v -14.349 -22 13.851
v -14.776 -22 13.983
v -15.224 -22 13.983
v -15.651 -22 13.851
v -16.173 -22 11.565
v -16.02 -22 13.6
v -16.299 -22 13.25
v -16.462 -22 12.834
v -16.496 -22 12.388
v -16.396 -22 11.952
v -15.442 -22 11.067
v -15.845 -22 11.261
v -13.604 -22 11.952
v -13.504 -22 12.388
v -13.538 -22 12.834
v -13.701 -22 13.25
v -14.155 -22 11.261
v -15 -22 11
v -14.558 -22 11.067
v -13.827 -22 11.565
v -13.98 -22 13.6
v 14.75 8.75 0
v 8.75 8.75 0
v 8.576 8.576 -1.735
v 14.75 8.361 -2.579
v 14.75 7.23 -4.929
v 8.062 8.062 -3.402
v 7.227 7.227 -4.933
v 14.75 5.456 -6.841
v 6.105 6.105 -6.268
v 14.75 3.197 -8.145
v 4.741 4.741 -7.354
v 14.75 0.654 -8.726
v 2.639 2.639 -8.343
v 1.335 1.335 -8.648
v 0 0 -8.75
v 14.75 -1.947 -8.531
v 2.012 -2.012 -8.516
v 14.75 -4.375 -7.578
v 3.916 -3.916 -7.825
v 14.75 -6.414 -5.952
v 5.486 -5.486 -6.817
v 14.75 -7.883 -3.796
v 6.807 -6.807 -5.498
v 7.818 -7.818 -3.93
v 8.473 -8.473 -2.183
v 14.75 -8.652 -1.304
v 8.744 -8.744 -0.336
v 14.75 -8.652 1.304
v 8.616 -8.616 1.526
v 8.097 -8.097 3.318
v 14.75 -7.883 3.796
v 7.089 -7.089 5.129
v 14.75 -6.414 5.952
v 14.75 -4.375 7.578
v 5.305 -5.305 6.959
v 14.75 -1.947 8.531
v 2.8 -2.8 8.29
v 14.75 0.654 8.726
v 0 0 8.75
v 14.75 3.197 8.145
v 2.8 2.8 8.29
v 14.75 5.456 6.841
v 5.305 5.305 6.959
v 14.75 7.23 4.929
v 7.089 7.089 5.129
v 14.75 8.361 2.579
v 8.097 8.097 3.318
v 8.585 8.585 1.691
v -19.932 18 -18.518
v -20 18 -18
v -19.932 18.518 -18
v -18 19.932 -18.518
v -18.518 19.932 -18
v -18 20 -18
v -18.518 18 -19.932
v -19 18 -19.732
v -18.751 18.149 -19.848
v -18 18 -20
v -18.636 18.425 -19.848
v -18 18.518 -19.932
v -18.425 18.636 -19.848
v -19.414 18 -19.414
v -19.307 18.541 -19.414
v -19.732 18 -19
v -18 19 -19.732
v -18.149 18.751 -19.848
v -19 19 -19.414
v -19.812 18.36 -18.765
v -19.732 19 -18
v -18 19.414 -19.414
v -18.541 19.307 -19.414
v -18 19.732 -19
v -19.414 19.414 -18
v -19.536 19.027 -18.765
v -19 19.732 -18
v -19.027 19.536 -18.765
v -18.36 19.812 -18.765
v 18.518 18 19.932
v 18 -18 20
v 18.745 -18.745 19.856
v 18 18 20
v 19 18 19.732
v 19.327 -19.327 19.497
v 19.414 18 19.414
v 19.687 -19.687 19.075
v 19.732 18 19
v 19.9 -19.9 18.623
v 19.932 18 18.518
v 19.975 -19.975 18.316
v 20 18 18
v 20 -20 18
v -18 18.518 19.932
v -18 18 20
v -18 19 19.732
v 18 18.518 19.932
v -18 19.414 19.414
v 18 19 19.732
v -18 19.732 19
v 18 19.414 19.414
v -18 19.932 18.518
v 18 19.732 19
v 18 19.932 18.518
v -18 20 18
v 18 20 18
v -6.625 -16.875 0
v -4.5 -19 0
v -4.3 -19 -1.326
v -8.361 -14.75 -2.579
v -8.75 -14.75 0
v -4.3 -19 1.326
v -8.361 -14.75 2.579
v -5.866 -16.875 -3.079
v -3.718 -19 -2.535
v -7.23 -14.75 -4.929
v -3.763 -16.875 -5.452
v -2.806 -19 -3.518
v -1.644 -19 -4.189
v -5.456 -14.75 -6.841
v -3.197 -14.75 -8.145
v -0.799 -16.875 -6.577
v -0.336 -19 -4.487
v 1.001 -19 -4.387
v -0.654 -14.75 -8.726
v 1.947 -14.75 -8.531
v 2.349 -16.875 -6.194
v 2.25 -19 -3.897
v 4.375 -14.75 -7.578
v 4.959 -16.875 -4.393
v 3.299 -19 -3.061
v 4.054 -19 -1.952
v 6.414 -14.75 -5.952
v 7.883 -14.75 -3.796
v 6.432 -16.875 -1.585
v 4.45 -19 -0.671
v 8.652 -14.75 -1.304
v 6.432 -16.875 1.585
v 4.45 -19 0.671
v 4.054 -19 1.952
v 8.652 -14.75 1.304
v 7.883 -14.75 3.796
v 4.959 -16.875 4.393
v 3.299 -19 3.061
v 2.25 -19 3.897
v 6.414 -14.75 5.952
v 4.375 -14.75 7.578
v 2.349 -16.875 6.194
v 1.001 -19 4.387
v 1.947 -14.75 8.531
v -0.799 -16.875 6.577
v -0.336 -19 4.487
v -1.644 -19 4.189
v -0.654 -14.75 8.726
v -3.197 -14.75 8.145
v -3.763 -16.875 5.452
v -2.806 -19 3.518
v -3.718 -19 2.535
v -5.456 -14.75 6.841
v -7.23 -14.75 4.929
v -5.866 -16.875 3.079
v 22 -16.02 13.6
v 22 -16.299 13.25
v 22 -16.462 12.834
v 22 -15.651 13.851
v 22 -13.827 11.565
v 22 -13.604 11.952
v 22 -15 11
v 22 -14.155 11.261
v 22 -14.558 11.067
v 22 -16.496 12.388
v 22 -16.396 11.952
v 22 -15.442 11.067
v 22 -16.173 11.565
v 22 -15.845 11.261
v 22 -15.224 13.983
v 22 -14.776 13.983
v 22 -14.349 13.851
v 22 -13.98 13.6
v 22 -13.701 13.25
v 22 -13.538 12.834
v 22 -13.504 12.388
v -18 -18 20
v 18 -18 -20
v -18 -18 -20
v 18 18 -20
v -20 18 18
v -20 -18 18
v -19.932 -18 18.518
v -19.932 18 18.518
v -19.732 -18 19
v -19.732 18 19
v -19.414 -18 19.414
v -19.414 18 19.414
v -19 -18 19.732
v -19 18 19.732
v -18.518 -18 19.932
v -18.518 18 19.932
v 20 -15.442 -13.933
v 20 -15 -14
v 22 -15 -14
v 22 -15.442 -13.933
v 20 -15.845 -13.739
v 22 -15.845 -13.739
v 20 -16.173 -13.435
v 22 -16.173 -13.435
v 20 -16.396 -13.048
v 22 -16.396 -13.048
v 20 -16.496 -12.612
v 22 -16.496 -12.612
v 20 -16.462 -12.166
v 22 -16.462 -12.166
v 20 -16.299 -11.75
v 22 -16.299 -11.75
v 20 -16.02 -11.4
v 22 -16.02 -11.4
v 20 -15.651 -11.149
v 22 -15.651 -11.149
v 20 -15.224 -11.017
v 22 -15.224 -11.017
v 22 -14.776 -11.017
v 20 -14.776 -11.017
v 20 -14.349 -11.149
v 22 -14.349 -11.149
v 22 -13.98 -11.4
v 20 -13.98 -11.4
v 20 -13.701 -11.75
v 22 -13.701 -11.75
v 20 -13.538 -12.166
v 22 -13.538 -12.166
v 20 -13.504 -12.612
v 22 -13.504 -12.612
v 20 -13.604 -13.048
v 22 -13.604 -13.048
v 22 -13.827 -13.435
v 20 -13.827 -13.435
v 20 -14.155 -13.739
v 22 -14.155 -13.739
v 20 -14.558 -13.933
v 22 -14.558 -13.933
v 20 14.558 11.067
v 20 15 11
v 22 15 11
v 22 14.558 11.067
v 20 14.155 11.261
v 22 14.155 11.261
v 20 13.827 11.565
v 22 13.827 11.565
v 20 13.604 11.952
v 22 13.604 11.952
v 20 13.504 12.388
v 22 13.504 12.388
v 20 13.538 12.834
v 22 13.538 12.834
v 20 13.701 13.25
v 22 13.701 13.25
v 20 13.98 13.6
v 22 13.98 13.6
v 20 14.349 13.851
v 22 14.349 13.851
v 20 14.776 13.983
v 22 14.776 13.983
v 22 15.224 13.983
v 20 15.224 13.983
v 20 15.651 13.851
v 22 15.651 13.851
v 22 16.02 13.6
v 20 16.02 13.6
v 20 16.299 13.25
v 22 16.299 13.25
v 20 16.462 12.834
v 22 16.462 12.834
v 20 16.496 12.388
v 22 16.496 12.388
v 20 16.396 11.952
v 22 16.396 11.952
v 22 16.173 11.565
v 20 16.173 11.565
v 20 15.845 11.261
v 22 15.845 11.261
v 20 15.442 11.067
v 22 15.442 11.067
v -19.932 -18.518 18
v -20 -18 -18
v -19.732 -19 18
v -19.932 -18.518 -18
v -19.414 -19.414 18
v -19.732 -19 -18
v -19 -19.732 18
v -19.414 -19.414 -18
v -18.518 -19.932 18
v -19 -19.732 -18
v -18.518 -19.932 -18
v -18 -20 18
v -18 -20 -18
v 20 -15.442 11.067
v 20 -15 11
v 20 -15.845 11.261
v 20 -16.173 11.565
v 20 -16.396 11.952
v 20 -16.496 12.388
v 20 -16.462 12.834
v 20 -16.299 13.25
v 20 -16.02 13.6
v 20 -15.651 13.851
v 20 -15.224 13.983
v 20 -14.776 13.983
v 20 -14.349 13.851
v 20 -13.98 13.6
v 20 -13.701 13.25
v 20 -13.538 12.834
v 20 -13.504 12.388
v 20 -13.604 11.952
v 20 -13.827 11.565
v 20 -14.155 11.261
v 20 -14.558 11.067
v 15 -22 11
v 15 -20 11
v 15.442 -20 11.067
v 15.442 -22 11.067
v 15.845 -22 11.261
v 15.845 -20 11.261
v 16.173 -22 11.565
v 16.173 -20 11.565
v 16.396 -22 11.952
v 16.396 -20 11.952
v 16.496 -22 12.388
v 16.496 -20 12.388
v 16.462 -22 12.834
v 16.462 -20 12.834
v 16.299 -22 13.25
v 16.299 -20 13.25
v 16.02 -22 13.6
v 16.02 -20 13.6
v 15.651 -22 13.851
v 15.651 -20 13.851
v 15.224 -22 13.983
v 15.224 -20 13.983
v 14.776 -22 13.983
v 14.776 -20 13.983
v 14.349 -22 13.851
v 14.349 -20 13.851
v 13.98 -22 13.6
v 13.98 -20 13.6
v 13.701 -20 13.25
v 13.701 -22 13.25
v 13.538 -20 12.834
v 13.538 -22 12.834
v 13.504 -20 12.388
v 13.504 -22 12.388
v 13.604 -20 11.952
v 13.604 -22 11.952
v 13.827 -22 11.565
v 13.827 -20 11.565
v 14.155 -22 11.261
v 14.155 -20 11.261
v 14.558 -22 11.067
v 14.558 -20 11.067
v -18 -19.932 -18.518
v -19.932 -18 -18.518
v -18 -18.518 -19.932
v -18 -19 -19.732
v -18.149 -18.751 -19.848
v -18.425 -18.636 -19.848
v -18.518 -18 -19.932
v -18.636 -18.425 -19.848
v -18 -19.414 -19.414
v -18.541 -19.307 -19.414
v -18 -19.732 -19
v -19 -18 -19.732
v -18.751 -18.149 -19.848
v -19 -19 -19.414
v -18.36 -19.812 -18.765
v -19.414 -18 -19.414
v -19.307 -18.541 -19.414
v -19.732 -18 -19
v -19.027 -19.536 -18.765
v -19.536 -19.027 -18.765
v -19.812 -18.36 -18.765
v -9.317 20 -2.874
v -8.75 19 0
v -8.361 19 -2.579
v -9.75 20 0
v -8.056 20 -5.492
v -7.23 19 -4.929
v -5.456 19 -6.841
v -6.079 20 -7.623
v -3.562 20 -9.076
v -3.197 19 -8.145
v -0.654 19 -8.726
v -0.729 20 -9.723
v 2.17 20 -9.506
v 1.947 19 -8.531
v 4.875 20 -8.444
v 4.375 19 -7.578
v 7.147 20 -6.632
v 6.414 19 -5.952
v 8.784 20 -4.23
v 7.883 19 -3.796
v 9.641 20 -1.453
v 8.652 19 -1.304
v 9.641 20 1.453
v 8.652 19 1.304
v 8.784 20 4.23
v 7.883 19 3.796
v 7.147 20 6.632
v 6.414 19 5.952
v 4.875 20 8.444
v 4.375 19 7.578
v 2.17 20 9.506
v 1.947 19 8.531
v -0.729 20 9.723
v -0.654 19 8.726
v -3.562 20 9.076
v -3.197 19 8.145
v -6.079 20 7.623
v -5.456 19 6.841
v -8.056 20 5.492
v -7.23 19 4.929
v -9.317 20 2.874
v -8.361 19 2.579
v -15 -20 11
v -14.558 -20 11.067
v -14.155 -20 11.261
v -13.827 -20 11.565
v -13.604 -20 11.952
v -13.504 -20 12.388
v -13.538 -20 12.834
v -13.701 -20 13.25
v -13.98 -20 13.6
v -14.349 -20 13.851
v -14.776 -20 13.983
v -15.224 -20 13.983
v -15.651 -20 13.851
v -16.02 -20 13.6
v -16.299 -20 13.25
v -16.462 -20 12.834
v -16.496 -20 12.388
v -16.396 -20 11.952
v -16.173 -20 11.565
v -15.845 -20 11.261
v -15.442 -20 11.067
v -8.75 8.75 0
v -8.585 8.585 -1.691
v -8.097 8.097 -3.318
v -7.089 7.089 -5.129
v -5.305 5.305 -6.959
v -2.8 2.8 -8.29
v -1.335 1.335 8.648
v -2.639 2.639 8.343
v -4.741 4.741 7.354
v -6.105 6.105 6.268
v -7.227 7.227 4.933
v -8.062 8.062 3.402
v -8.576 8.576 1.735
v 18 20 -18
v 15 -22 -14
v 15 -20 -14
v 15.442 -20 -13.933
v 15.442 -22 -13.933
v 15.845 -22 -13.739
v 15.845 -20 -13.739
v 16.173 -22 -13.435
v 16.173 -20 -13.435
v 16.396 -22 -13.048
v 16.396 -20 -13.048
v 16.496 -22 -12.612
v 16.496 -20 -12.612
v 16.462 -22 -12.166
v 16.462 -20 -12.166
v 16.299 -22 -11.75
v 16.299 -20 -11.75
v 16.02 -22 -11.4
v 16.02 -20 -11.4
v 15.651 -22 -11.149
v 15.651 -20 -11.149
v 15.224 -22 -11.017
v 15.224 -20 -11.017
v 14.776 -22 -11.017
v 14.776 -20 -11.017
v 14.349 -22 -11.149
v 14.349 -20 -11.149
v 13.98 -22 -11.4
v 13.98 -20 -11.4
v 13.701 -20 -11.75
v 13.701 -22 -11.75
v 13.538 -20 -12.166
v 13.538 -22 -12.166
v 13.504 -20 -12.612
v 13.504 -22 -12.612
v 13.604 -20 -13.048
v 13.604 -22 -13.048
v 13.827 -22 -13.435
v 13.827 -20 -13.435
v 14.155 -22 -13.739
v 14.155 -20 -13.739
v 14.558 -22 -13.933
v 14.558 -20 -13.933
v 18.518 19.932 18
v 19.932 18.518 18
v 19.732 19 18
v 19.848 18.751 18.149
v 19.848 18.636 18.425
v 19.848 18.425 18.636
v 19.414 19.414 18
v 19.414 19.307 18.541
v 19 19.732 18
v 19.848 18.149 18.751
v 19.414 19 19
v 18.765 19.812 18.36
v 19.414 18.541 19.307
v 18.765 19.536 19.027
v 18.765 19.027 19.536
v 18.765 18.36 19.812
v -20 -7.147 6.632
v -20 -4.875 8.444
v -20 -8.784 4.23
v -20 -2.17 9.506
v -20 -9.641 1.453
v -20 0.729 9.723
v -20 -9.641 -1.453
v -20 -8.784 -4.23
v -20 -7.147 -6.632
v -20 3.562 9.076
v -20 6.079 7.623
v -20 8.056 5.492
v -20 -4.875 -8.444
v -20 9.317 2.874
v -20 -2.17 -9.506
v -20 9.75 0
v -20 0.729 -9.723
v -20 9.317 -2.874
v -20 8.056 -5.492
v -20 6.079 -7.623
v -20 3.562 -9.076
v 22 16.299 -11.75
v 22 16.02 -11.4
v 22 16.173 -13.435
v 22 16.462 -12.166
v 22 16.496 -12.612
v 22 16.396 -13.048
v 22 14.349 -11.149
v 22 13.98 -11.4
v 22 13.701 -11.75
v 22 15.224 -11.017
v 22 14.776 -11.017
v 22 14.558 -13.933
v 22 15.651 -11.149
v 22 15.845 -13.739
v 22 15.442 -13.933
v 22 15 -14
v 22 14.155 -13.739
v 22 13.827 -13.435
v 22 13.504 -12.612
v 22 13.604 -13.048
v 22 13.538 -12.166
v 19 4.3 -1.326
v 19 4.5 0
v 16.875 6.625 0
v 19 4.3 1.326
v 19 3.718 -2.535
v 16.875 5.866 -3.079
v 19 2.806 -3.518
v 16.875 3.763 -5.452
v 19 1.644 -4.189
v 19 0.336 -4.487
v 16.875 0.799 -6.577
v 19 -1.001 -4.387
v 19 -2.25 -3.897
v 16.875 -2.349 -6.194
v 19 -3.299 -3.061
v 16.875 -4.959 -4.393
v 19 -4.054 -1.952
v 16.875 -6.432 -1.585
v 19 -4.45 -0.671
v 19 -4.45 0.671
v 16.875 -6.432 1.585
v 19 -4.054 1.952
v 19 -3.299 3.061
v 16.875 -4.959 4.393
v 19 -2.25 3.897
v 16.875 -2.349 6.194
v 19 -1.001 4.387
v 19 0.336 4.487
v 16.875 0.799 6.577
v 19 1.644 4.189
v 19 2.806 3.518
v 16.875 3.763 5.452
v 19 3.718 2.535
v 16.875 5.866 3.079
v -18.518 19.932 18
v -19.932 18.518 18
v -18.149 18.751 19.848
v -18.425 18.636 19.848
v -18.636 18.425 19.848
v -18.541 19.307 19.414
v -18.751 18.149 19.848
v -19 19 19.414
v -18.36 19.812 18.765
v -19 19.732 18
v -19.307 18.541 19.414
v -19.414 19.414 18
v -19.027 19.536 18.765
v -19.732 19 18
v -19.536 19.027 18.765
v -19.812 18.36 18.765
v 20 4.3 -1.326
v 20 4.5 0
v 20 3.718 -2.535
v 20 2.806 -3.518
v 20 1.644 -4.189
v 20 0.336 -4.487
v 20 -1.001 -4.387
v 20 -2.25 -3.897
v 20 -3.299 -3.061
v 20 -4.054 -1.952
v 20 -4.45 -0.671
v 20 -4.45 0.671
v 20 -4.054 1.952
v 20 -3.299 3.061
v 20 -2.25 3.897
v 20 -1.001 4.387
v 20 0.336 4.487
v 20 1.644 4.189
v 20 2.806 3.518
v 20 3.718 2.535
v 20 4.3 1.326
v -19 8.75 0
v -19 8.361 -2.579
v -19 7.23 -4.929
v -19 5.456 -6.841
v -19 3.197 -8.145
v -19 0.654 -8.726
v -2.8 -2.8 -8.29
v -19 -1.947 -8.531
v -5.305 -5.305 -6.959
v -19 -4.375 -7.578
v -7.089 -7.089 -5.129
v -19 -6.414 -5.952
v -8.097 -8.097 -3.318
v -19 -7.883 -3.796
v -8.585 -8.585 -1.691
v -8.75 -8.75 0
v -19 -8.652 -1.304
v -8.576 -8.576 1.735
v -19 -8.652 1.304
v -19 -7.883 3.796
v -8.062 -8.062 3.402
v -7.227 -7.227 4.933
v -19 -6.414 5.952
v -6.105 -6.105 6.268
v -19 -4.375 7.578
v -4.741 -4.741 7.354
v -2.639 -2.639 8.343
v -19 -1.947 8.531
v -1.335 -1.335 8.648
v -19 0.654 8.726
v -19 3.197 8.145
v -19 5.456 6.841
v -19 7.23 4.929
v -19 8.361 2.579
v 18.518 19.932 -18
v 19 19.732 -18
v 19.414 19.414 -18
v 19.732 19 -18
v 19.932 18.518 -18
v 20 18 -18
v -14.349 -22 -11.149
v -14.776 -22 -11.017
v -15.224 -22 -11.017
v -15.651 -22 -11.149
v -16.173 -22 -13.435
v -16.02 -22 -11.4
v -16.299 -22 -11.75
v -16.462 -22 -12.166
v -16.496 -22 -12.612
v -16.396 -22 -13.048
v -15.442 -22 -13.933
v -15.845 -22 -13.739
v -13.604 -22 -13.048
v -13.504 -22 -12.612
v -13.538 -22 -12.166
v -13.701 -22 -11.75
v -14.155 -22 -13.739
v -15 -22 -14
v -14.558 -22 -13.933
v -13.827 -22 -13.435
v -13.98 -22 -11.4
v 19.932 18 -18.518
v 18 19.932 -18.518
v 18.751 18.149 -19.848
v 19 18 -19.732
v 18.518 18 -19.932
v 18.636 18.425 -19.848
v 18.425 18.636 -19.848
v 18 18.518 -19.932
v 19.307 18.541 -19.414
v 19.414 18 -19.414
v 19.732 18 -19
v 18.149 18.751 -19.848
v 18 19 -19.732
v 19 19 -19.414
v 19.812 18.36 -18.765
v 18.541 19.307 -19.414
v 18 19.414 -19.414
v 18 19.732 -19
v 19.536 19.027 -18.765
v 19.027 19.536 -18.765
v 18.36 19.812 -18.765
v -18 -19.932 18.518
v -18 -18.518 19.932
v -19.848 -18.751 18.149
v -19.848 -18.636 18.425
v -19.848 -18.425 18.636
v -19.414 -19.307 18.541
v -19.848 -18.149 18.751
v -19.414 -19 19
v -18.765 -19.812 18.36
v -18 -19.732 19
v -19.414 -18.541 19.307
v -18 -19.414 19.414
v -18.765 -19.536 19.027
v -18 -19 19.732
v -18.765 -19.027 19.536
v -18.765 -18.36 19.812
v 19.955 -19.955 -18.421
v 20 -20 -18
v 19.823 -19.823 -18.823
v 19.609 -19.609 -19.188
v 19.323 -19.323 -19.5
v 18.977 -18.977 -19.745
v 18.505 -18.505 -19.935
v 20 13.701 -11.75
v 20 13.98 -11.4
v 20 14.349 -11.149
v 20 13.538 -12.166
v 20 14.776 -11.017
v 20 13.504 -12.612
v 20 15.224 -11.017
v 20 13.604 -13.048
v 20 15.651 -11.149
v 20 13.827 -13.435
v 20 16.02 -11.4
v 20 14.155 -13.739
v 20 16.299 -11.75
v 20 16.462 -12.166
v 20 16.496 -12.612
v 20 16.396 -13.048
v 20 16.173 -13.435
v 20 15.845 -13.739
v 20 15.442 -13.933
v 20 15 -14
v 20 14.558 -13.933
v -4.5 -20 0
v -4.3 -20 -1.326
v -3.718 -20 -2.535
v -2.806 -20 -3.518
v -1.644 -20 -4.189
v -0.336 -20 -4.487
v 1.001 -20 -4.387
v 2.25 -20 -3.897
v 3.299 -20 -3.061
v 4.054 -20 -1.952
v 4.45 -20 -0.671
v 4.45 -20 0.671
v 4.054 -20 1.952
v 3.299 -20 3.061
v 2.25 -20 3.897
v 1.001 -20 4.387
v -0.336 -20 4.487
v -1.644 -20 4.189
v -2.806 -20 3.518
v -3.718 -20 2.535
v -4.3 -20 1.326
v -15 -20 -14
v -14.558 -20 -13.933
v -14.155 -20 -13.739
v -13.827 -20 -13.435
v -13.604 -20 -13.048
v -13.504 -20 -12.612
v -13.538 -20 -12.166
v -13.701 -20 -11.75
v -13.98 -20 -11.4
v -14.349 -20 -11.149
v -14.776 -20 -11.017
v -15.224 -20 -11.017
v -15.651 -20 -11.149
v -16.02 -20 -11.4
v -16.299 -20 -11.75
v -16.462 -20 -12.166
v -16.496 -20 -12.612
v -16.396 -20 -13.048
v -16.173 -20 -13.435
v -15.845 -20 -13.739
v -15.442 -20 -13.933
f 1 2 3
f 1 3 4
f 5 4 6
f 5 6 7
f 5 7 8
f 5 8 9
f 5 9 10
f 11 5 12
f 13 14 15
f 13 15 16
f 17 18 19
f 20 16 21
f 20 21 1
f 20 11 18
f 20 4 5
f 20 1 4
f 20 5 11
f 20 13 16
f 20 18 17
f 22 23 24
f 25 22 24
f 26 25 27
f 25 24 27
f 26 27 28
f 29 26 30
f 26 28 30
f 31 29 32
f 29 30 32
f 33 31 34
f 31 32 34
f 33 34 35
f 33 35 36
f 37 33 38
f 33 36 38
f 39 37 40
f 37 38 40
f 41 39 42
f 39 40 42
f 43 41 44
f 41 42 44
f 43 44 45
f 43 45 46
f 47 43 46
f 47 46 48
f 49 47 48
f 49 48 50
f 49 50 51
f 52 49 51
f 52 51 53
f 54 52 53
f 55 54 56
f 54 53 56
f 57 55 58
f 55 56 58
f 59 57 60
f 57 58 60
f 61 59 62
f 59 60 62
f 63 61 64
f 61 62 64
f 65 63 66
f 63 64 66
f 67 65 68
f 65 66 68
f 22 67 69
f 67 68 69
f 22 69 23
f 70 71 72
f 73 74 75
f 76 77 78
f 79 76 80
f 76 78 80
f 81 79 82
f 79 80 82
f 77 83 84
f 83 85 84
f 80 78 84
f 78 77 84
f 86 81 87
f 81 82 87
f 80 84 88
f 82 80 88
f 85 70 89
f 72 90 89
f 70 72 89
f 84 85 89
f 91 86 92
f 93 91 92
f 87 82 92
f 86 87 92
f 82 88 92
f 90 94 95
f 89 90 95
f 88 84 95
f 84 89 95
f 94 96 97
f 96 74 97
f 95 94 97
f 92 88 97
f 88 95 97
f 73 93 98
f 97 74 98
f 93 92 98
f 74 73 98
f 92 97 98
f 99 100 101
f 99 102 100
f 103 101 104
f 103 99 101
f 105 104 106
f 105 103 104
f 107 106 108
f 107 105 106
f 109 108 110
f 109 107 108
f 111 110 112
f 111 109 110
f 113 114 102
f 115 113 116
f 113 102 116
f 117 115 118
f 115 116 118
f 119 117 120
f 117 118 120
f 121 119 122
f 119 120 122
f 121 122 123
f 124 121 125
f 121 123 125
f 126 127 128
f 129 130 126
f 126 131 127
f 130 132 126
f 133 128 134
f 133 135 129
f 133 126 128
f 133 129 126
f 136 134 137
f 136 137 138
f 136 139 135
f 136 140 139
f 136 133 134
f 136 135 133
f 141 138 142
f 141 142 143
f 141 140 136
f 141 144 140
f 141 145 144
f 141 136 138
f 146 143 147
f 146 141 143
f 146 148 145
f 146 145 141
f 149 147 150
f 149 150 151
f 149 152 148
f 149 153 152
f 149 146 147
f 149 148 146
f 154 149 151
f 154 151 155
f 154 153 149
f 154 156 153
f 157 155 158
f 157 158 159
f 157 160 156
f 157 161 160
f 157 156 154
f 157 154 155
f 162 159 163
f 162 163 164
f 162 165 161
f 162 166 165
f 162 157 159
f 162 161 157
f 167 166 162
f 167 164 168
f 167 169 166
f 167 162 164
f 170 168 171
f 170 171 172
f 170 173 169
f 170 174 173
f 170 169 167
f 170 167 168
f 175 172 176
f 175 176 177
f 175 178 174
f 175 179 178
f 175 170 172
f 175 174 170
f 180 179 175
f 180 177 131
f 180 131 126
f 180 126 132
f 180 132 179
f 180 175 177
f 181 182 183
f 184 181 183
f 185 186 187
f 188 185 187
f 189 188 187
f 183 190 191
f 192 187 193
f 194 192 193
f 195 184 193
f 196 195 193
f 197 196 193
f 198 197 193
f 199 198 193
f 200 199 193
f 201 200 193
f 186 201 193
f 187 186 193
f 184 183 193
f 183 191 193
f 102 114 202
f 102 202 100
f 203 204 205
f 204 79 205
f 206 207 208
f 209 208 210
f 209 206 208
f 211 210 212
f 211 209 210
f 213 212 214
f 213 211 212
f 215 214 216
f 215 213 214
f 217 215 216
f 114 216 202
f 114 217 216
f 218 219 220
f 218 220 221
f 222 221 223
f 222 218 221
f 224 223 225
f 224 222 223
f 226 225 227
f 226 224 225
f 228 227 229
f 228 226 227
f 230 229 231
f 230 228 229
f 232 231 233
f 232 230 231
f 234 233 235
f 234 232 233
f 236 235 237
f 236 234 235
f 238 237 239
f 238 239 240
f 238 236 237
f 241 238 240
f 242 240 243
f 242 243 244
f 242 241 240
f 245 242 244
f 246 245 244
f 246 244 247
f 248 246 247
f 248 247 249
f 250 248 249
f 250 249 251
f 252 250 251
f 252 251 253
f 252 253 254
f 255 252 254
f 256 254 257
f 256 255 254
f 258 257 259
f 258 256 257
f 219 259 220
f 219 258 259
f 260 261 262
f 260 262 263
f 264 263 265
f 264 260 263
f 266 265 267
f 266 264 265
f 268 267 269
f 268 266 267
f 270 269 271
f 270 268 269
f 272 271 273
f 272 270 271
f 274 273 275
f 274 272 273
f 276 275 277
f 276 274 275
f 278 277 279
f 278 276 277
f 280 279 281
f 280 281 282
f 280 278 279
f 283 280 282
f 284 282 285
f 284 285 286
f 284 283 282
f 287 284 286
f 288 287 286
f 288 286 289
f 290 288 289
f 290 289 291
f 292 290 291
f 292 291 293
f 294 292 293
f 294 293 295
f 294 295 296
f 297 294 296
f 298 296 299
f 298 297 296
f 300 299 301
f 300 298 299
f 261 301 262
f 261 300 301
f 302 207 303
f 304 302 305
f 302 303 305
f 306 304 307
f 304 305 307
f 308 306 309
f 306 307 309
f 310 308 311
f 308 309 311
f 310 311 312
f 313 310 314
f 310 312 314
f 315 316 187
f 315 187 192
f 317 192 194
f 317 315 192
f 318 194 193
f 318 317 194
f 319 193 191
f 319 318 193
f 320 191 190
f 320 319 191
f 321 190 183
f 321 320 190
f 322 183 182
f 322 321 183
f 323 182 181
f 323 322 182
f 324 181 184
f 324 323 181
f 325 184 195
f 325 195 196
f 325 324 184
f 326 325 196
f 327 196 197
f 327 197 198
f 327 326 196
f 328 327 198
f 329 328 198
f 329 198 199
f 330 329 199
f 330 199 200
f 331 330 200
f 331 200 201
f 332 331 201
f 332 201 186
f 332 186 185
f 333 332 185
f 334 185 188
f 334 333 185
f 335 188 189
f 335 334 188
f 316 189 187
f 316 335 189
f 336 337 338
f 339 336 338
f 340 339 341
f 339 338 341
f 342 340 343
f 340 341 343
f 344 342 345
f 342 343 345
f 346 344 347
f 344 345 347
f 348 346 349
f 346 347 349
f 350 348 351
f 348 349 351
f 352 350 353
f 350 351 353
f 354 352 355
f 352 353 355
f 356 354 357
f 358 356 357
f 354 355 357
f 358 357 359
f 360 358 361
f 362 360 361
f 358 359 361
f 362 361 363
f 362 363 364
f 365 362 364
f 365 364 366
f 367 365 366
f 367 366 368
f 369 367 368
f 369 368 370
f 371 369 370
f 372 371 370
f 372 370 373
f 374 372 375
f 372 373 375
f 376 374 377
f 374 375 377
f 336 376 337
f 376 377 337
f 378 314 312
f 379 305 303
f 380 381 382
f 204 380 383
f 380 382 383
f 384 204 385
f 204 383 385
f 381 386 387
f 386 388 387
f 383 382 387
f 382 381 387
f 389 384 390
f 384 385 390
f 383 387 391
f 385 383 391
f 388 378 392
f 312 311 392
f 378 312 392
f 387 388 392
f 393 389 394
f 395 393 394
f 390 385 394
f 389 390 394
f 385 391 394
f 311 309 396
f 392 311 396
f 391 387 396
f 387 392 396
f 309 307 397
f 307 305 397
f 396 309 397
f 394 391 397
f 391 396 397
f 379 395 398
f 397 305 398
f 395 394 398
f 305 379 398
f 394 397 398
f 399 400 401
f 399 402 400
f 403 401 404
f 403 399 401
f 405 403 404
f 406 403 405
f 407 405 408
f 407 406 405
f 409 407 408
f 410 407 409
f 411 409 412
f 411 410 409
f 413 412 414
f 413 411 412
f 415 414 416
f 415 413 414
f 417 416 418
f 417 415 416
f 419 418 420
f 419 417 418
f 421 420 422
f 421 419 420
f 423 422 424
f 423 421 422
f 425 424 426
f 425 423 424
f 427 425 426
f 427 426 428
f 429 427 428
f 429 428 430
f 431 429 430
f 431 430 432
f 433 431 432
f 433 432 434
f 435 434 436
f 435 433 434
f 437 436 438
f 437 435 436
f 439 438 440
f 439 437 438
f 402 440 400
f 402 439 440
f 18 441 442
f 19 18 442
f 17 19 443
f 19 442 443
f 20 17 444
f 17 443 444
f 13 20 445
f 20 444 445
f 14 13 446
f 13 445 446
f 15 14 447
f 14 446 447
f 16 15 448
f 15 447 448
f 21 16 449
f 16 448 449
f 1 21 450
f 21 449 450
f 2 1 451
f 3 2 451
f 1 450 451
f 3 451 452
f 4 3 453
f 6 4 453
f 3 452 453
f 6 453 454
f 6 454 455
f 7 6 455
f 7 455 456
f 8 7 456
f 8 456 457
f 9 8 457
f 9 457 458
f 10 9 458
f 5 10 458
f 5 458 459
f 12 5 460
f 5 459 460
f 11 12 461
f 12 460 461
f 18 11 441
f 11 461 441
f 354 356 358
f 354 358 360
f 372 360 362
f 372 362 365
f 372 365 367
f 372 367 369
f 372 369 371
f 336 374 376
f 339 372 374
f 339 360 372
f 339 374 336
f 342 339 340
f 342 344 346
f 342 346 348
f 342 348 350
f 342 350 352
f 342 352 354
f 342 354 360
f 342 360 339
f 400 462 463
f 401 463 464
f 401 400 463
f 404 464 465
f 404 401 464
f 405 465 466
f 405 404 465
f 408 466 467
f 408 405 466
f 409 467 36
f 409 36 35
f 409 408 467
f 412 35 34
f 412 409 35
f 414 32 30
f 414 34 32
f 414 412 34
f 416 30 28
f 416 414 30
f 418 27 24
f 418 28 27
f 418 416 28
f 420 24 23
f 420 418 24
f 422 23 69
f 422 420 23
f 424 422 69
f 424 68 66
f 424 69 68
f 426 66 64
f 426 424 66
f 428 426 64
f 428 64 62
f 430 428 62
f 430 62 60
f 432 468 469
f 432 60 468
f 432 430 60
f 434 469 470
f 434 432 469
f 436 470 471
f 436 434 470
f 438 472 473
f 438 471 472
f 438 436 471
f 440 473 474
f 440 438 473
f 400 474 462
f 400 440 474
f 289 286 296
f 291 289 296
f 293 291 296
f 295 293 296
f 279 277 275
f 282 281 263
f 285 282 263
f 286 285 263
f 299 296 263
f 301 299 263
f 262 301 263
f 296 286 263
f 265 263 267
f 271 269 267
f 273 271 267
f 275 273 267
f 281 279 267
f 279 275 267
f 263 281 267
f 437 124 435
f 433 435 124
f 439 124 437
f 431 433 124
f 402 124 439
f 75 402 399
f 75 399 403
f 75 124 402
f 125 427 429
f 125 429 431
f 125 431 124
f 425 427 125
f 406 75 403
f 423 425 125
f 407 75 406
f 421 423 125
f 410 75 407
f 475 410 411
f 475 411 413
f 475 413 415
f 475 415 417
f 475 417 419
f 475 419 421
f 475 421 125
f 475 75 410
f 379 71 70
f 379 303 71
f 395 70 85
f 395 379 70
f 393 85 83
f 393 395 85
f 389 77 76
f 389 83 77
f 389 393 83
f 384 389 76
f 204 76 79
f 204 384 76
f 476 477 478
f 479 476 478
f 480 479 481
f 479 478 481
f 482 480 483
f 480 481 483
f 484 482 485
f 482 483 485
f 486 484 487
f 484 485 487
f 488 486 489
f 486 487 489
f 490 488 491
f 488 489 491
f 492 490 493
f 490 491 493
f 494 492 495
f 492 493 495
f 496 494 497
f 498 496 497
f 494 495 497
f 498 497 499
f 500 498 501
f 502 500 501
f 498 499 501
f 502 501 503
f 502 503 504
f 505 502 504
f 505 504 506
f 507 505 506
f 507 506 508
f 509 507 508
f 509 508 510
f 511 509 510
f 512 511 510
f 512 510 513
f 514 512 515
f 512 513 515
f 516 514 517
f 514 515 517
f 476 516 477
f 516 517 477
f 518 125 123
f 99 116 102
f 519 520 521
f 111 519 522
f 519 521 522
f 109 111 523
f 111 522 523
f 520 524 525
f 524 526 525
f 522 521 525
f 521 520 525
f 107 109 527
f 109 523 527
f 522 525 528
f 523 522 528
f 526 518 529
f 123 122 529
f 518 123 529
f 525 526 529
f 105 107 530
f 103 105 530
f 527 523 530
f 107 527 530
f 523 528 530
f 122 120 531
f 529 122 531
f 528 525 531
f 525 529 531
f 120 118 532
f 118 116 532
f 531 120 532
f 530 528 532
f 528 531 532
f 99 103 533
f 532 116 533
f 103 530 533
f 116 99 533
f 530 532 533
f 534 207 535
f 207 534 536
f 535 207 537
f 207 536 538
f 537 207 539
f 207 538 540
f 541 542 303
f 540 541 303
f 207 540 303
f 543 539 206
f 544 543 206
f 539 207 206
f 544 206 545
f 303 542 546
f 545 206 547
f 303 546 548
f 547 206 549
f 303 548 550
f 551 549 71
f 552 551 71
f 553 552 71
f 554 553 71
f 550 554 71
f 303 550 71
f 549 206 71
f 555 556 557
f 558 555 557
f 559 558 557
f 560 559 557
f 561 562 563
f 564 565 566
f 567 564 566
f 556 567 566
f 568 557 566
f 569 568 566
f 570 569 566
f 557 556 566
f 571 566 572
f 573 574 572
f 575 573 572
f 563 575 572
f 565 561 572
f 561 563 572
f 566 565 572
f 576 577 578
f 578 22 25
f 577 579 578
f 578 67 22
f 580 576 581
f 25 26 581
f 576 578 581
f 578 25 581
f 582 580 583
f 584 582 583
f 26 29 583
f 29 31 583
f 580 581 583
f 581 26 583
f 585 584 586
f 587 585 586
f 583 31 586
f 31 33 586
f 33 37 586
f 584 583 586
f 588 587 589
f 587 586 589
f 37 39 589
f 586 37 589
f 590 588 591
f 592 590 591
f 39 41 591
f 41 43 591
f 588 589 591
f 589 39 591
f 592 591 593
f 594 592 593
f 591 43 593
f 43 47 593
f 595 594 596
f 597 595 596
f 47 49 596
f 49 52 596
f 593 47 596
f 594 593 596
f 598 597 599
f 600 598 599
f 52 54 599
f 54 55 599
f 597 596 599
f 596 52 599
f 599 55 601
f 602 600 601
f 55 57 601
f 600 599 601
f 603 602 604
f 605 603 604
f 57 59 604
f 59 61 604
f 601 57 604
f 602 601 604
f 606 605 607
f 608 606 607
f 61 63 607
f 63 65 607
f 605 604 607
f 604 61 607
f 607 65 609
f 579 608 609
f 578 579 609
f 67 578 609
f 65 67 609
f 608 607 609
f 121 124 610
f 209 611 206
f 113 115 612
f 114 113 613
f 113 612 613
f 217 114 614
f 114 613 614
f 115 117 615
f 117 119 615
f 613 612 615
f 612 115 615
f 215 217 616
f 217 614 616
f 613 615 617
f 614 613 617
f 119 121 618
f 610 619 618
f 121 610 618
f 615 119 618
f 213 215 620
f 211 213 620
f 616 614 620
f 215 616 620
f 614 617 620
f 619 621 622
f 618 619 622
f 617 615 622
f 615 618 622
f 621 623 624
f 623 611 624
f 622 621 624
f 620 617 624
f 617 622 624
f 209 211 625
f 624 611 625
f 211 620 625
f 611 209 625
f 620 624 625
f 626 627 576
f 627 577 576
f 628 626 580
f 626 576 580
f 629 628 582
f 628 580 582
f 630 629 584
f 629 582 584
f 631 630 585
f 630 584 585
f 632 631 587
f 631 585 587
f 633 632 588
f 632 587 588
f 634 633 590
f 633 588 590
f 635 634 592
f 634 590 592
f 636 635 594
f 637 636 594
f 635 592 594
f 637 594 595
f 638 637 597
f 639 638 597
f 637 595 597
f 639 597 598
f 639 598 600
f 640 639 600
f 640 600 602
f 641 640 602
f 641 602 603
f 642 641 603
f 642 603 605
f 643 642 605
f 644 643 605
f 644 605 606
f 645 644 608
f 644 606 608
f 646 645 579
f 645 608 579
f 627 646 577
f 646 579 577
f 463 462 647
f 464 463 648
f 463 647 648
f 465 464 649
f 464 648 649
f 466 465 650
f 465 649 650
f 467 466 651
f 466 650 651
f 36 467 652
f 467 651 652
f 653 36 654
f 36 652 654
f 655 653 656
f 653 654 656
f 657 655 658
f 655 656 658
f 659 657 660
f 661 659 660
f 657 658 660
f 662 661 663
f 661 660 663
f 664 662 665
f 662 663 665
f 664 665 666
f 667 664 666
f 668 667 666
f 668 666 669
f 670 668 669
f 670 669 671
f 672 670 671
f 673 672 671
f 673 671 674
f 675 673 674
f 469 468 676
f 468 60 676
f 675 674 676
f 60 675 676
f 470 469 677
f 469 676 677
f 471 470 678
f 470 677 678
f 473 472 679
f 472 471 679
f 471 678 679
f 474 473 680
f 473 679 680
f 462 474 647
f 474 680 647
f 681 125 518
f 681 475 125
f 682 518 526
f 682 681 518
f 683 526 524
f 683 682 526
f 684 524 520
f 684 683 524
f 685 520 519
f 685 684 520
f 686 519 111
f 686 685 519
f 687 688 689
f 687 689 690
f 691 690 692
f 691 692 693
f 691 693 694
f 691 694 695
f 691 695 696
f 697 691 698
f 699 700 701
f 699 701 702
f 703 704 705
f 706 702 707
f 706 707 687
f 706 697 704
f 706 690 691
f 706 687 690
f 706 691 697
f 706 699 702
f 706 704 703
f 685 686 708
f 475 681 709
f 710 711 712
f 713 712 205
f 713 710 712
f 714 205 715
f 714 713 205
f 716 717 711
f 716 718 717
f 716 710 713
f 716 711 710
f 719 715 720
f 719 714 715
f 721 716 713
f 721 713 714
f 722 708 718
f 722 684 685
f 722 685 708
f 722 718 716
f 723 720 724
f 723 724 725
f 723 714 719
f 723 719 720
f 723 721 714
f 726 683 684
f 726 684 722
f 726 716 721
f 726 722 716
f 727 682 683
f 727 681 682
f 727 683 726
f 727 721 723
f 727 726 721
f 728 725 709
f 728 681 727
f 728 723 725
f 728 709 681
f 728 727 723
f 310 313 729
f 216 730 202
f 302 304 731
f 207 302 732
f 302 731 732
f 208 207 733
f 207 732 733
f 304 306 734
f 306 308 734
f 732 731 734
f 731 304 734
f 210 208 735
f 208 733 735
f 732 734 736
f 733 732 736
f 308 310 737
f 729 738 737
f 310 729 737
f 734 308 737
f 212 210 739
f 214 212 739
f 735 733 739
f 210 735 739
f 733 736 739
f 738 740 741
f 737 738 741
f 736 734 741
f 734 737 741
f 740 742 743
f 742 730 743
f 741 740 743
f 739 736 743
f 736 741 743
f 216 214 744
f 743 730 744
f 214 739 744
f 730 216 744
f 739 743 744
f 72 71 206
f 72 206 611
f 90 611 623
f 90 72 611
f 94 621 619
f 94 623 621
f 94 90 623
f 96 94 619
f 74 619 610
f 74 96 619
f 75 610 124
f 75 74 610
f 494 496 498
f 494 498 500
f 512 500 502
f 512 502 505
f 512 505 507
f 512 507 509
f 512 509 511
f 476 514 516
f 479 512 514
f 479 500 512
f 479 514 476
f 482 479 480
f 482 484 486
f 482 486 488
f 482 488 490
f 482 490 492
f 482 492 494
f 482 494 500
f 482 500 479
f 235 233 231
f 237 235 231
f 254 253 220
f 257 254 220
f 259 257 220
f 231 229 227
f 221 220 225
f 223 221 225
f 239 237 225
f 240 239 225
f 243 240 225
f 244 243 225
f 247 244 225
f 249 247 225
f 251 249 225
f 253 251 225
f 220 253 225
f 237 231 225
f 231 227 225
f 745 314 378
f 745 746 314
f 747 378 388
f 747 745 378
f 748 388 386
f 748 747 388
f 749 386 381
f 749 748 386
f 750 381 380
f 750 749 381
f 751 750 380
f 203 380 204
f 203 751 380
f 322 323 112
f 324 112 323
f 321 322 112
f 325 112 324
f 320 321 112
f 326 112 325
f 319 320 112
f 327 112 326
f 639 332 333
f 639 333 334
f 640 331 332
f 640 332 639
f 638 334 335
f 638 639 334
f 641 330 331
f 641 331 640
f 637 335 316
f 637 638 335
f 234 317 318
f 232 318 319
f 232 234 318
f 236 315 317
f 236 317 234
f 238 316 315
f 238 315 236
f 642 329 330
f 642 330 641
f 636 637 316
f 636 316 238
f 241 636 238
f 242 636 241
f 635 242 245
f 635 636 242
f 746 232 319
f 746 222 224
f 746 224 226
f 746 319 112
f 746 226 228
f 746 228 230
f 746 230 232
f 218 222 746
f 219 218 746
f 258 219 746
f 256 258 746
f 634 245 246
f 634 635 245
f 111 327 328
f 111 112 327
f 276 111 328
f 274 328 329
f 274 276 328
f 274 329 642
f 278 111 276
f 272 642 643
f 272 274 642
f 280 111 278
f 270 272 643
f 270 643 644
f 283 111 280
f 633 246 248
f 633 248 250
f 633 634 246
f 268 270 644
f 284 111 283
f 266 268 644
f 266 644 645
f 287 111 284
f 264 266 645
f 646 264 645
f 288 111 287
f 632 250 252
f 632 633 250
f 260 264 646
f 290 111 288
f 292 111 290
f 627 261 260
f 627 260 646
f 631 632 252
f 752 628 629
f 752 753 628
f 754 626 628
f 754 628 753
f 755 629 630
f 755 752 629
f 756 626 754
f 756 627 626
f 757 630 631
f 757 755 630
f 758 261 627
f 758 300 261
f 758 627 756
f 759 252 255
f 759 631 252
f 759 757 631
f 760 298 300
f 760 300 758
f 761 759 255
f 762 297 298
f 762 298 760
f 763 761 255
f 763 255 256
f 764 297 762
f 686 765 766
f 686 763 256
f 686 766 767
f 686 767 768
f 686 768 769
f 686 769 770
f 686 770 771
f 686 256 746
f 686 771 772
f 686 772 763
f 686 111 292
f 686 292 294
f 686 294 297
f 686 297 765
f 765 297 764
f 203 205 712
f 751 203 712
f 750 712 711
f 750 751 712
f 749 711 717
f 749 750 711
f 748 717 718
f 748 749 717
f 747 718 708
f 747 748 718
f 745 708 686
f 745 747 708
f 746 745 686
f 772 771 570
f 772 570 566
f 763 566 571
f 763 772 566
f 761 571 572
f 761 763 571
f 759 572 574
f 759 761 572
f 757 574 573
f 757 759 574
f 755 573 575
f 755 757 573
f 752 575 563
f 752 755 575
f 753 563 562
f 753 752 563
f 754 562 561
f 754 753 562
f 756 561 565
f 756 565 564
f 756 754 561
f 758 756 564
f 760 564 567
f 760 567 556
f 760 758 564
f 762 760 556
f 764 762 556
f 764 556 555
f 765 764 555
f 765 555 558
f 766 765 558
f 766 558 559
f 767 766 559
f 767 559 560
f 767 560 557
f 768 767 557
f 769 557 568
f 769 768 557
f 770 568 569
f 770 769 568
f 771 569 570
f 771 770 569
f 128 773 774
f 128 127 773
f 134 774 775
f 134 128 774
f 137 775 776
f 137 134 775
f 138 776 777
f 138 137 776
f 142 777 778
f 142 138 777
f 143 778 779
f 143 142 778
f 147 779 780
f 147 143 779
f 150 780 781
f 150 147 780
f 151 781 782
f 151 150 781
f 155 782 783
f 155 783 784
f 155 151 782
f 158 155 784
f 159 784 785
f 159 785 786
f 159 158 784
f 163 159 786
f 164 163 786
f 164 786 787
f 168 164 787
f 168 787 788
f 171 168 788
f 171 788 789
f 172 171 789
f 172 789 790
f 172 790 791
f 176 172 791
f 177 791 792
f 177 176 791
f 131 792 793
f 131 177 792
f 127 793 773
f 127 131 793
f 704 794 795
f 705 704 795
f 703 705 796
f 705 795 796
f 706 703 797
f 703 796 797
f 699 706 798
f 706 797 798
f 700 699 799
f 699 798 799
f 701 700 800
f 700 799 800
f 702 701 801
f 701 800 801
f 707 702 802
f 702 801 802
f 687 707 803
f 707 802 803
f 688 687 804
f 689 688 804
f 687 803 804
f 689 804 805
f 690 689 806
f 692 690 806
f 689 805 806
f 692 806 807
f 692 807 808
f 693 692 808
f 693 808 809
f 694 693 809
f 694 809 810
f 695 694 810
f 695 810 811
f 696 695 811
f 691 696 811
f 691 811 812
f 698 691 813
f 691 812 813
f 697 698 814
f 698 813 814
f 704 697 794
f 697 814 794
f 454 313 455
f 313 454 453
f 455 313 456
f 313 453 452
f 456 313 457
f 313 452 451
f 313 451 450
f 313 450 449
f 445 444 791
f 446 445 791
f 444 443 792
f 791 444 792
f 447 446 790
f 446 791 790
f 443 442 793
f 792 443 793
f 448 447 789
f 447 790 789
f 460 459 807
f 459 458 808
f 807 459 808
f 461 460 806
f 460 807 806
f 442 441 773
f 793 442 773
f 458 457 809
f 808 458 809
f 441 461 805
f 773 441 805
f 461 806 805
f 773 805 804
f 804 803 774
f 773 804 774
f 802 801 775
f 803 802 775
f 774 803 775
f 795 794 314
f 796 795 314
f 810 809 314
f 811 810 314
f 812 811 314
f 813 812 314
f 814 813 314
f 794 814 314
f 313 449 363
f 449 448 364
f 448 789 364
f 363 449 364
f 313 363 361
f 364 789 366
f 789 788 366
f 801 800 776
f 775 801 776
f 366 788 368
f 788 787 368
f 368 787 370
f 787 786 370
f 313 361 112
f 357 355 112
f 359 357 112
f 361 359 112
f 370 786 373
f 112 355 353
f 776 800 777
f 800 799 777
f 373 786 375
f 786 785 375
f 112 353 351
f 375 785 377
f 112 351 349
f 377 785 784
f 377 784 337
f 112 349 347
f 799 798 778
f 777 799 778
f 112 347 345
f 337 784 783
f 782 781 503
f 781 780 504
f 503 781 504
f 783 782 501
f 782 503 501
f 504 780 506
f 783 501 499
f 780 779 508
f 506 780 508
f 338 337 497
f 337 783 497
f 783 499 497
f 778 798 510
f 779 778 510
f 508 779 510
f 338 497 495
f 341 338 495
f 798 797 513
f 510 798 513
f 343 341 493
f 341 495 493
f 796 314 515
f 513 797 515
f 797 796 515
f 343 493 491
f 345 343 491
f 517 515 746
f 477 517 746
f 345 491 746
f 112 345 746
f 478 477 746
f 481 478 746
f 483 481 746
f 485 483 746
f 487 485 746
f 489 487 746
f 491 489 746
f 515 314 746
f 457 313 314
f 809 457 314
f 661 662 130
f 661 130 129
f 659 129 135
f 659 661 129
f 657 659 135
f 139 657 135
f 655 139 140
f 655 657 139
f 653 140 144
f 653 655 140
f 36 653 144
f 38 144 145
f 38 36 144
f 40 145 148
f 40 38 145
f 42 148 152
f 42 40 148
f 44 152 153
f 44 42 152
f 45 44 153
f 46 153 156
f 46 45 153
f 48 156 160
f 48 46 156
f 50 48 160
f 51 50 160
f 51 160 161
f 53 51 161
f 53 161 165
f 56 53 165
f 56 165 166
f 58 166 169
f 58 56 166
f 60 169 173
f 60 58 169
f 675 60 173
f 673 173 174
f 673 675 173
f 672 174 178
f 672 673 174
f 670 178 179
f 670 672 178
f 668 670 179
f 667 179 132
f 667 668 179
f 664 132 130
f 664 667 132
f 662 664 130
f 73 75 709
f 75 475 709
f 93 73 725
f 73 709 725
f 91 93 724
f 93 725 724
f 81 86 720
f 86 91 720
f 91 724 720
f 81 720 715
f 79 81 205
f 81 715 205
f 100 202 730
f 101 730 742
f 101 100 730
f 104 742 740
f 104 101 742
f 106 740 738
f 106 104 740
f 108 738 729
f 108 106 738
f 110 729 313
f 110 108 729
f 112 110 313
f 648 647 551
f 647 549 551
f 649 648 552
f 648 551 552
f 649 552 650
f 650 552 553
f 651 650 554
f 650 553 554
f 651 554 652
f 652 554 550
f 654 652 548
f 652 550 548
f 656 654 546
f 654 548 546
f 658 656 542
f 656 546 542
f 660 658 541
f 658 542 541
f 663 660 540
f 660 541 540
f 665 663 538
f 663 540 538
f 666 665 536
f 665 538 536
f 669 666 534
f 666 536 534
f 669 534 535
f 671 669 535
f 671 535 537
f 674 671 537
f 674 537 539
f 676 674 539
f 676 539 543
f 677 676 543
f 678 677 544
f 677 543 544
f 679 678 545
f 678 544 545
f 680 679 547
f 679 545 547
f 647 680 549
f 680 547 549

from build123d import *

# Parameters (mm, degrees)
SKETCH_1_W      = 40
SKETCH_1_H      = 40
EXTRUDE_1_DEPTH = 20
SKETCH_5_R      = 1.5
EXTRUDE_2_DEPTH = 2
FILLET_1_R      = 2


with BuildPart() as part:
    # Эскиз1 → Бобышка-Вытянуть1 (new body, symmetric)
    with BuildSketch(Plane(origin=(0, 0, 0), x_dir=(1, 0, 0), z_dir=(0, 1, 0))):
        Rectangle(SKETCH_1_W, SKETCH_1_H)
    extrude(amount=EXTRUDE_1_DEPTH, both=True)

    # Эскиз4 → Вырез-Повернуть1 (revolve, cut)
    with BuildSketch(Plane.XY):
        Polygon((-4.5, -20), (-4.5, -19), (-8.75, -14.75), (-8.75, 19), (-9.75, 20), (0, 20), (0, -20), align=None)
    cut_revolve_1 = revolve(axis=Axis((0, 20, 0), (0, -1, 0)), mode=Mode.SUBTRACT)

    # Эскиз5 → Бобышка-Вытянуть2 (add)
    with BuildSketch(Plane.XZ.offset(20)):
        with Locations(Location((-15, 12.5, 0), (0, 0, 270))):  # turned: the seam where the file's is
            Circle(SKETCH_5_R)
        with Locations(Location((-15, -12.5, 0), (0, 0, 270))):  # turned: the seam where the file's is
            Circle(SKETCH_5_R)
        with Locations(Location((15, -12.5, 0), (0, 0, 270))):  # turned: the seam where the file's is
            Circle(SKETCH_5_R)
        with Locations(Location((15, 12.5, 0), (0, 0, 270))):  # turned: the seam where the file's is
            Circle(SKETCH_5_R)
    extrude_2 = extrude(amount=EXTRUDE_2_DEPTH)

    # Зеркальное отражение1: Вырез-Повернуть1, Бобышка-Вытянуть2 across plane
    add(cut_revolve_1.mirror(Plane(origin=(0, 0, 0), x_dir=(0, 0, 1), z_dir=(0.707106781, 0.707106781, 0))), mode=Mode.SUBTRACT)
    add(extrude_2.mirror(Plane(origin=(0, 0, 0), x_dir=(0, 0, 1), z_dir=(0.707106781, 0.707106781, 0))))

    # Скругление1
    fillet_1_edges = [part.edges().sort_by_distance(p)[0] for p in [
        (-20, 20, 0),
        (0, 20, 20),
        (20, 20, 0),
        (0, -20, 20),
        (-20, -20, 0),
        (0, -20, -20),
        (20, 0, 20),
        (-20, 0, 20),
        (-20, 0, -20),
        (20, 0, -20),
        (0, 20, -20),
    ]]
    fillet(fillet_1_edges, radius=FILLET_1_R)


solid = part.part
